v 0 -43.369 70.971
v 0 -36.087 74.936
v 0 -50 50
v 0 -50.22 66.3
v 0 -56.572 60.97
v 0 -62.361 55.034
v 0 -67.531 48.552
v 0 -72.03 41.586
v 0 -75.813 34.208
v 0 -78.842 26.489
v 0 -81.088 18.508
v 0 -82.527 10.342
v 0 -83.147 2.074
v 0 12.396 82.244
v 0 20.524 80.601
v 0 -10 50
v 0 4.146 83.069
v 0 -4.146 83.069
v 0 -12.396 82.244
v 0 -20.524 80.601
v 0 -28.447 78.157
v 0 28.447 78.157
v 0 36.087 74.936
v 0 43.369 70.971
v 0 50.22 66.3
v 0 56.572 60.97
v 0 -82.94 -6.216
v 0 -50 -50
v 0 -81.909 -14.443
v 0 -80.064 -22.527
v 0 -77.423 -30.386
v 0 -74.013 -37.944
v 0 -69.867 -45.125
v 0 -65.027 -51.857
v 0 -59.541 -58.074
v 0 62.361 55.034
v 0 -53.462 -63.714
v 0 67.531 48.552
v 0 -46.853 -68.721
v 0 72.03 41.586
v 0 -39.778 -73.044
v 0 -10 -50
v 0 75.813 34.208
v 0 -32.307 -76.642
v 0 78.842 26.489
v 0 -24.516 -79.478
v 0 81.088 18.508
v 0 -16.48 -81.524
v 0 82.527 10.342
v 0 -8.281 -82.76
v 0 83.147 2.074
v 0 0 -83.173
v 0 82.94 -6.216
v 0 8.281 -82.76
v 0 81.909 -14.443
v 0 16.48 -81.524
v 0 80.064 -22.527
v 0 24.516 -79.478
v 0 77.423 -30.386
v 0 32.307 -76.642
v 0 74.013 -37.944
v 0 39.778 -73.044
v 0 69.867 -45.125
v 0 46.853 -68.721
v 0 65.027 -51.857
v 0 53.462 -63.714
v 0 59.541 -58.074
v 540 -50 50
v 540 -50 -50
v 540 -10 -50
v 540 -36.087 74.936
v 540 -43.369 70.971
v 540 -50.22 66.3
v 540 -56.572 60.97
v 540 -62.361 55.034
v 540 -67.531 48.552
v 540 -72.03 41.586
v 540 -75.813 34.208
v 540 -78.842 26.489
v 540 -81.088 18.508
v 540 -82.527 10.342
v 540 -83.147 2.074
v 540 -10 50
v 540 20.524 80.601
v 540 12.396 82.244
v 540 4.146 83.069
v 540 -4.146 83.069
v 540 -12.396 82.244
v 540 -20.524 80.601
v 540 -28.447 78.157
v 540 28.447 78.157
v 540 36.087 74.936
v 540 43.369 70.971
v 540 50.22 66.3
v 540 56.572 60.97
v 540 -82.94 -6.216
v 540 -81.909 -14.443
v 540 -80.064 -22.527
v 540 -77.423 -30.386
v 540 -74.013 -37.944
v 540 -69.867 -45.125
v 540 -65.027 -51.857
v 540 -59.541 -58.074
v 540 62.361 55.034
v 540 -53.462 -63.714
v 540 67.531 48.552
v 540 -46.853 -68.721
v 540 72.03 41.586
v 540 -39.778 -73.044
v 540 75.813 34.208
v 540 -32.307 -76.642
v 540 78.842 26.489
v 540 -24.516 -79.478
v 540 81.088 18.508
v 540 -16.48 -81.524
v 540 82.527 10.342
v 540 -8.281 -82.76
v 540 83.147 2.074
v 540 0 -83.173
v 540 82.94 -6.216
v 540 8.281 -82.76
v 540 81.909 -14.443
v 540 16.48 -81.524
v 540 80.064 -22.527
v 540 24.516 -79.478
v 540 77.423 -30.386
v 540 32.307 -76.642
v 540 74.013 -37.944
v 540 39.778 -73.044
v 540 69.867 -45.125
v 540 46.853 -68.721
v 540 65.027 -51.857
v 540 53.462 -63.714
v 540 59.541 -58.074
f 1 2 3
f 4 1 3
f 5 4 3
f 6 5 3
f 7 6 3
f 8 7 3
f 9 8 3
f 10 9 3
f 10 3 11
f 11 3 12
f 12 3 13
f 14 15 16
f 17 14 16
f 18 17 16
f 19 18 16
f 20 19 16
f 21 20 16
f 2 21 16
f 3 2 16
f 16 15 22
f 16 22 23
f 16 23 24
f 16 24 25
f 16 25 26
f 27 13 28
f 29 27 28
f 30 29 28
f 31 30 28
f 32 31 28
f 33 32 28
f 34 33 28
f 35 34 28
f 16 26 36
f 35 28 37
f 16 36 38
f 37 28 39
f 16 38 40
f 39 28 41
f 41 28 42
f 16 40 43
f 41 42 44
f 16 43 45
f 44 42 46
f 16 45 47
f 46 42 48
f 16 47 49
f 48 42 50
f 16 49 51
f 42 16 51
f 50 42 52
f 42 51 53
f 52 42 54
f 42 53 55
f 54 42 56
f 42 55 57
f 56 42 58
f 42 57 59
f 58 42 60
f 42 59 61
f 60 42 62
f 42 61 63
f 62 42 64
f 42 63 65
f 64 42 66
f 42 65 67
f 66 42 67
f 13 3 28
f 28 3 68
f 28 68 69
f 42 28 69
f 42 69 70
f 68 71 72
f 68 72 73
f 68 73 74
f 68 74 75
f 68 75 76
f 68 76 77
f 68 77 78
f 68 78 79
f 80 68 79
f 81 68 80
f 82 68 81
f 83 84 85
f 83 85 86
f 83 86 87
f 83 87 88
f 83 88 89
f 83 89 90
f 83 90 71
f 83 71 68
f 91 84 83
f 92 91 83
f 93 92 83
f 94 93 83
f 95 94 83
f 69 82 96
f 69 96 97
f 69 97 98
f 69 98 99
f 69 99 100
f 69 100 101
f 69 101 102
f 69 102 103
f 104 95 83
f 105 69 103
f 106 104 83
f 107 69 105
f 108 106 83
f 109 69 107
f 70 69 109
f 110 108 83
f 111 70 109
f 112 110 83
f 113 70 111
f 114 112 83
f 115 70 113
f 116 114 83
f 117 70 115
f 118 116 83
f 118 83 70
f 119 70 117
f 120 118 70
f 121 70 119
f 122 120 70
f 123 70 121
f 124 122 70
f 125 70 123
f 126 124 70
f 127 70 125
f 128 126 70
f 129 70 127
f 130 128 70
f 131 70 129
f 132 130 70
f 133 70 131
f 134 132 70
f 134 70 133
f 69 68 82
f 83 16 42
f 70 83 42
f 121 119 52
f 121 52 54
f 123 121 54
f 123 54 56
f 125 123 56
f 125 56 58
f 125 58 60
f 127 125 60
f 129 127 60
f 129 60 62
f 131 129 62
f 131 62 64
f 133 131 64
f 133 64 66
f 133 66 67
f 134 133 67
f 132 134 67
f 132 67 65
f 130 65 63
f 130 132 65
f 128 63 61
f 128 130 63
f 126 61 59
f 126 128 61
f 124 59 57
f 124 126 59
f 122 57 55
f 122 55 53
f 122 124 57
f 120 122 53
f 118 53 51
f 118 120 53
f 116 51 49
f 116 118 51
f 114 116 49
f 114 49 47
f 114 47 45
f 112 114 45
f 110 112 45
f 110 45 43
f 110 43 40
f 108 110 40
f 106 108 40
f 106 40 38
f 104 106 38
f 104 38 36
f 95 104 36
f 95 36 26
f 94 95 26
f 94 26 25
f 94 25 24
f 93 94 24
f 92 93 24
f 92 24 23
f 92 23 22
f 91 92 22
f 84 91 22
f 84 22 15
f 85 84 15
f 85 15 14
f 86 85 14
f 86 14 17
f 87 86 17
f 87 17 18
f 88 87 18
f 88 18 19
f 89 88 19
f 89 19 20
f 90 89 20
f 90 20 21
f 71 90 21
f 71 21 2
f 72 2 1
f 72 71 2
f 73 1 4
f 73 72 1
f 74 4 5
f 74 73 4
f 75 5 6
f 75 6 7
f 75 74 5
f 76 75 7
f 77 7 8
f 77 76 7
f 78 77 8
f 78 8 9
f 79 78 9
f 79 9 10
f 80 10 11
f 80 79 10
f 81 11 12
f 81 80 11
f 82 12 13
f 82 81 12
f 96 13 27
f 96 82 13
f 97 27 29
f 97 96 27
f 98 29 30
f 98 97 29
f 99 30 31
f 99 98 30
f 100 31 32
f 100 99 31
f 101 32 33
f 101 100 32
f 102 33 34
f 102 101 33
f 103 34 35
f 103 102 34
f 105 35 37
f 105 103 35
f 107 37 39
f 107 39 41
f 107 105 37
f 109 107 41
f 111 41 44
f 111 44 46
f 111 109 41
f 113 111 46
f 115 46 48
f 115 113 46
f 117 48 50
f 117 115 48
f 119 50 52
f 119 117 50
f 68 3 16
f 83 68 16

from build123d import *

# Parameters (mm, degrees)
SKETCH1_R           = 93.17284
SKETCH1_W           = 100
SKETCH1_H           = 40
BOSS_EXTRUDE1_DEPTH = 540
SKETCH2_OUTSIDE_W   = 308.52
SKETCH2_OUTSIDE_H   = 308.52
SKETCH2_OUTSIDE_R   = 83.17284
CUT_EXTRUDE2_DEPTH  = 541


with BuildPart() as part:
    # Sketch1 → Boss-Extrude1 (new body)
    with BuildSketch(Plane(origin=(0, 0, 0), x_dir=(0, 0, -1), z_dir=(1, 0, 0))):
        Circle(SKETCH1_R)
        with Locations((0, -30)):
            Rectangle(SKETCH1_W, SKETCH1_H, mode=Mode.SUBTRACT)
    extrude(amount=BOSS_EXTRUDE1_DEPTH)

    # Sketch2 outside → Cut-Extrude2 (cut, through all)
    with BuildSketch(Plane(origin=(540, 0, 0), x_dir=(0, 0, -1), z_dir=(1, 0, 0))):
        Rectangle(SKETCH2_OUTSIDE_W, SKETCH2_OUTSIDE_H)
        Circle(SKETCH2_OUTSIDE_R, mode=Mode.SUBTRACT)
    extrude(amount=-CUT_EXTRUDE2_DEPTH, mode=Mode.SUBTRACT)


solid = part.part
